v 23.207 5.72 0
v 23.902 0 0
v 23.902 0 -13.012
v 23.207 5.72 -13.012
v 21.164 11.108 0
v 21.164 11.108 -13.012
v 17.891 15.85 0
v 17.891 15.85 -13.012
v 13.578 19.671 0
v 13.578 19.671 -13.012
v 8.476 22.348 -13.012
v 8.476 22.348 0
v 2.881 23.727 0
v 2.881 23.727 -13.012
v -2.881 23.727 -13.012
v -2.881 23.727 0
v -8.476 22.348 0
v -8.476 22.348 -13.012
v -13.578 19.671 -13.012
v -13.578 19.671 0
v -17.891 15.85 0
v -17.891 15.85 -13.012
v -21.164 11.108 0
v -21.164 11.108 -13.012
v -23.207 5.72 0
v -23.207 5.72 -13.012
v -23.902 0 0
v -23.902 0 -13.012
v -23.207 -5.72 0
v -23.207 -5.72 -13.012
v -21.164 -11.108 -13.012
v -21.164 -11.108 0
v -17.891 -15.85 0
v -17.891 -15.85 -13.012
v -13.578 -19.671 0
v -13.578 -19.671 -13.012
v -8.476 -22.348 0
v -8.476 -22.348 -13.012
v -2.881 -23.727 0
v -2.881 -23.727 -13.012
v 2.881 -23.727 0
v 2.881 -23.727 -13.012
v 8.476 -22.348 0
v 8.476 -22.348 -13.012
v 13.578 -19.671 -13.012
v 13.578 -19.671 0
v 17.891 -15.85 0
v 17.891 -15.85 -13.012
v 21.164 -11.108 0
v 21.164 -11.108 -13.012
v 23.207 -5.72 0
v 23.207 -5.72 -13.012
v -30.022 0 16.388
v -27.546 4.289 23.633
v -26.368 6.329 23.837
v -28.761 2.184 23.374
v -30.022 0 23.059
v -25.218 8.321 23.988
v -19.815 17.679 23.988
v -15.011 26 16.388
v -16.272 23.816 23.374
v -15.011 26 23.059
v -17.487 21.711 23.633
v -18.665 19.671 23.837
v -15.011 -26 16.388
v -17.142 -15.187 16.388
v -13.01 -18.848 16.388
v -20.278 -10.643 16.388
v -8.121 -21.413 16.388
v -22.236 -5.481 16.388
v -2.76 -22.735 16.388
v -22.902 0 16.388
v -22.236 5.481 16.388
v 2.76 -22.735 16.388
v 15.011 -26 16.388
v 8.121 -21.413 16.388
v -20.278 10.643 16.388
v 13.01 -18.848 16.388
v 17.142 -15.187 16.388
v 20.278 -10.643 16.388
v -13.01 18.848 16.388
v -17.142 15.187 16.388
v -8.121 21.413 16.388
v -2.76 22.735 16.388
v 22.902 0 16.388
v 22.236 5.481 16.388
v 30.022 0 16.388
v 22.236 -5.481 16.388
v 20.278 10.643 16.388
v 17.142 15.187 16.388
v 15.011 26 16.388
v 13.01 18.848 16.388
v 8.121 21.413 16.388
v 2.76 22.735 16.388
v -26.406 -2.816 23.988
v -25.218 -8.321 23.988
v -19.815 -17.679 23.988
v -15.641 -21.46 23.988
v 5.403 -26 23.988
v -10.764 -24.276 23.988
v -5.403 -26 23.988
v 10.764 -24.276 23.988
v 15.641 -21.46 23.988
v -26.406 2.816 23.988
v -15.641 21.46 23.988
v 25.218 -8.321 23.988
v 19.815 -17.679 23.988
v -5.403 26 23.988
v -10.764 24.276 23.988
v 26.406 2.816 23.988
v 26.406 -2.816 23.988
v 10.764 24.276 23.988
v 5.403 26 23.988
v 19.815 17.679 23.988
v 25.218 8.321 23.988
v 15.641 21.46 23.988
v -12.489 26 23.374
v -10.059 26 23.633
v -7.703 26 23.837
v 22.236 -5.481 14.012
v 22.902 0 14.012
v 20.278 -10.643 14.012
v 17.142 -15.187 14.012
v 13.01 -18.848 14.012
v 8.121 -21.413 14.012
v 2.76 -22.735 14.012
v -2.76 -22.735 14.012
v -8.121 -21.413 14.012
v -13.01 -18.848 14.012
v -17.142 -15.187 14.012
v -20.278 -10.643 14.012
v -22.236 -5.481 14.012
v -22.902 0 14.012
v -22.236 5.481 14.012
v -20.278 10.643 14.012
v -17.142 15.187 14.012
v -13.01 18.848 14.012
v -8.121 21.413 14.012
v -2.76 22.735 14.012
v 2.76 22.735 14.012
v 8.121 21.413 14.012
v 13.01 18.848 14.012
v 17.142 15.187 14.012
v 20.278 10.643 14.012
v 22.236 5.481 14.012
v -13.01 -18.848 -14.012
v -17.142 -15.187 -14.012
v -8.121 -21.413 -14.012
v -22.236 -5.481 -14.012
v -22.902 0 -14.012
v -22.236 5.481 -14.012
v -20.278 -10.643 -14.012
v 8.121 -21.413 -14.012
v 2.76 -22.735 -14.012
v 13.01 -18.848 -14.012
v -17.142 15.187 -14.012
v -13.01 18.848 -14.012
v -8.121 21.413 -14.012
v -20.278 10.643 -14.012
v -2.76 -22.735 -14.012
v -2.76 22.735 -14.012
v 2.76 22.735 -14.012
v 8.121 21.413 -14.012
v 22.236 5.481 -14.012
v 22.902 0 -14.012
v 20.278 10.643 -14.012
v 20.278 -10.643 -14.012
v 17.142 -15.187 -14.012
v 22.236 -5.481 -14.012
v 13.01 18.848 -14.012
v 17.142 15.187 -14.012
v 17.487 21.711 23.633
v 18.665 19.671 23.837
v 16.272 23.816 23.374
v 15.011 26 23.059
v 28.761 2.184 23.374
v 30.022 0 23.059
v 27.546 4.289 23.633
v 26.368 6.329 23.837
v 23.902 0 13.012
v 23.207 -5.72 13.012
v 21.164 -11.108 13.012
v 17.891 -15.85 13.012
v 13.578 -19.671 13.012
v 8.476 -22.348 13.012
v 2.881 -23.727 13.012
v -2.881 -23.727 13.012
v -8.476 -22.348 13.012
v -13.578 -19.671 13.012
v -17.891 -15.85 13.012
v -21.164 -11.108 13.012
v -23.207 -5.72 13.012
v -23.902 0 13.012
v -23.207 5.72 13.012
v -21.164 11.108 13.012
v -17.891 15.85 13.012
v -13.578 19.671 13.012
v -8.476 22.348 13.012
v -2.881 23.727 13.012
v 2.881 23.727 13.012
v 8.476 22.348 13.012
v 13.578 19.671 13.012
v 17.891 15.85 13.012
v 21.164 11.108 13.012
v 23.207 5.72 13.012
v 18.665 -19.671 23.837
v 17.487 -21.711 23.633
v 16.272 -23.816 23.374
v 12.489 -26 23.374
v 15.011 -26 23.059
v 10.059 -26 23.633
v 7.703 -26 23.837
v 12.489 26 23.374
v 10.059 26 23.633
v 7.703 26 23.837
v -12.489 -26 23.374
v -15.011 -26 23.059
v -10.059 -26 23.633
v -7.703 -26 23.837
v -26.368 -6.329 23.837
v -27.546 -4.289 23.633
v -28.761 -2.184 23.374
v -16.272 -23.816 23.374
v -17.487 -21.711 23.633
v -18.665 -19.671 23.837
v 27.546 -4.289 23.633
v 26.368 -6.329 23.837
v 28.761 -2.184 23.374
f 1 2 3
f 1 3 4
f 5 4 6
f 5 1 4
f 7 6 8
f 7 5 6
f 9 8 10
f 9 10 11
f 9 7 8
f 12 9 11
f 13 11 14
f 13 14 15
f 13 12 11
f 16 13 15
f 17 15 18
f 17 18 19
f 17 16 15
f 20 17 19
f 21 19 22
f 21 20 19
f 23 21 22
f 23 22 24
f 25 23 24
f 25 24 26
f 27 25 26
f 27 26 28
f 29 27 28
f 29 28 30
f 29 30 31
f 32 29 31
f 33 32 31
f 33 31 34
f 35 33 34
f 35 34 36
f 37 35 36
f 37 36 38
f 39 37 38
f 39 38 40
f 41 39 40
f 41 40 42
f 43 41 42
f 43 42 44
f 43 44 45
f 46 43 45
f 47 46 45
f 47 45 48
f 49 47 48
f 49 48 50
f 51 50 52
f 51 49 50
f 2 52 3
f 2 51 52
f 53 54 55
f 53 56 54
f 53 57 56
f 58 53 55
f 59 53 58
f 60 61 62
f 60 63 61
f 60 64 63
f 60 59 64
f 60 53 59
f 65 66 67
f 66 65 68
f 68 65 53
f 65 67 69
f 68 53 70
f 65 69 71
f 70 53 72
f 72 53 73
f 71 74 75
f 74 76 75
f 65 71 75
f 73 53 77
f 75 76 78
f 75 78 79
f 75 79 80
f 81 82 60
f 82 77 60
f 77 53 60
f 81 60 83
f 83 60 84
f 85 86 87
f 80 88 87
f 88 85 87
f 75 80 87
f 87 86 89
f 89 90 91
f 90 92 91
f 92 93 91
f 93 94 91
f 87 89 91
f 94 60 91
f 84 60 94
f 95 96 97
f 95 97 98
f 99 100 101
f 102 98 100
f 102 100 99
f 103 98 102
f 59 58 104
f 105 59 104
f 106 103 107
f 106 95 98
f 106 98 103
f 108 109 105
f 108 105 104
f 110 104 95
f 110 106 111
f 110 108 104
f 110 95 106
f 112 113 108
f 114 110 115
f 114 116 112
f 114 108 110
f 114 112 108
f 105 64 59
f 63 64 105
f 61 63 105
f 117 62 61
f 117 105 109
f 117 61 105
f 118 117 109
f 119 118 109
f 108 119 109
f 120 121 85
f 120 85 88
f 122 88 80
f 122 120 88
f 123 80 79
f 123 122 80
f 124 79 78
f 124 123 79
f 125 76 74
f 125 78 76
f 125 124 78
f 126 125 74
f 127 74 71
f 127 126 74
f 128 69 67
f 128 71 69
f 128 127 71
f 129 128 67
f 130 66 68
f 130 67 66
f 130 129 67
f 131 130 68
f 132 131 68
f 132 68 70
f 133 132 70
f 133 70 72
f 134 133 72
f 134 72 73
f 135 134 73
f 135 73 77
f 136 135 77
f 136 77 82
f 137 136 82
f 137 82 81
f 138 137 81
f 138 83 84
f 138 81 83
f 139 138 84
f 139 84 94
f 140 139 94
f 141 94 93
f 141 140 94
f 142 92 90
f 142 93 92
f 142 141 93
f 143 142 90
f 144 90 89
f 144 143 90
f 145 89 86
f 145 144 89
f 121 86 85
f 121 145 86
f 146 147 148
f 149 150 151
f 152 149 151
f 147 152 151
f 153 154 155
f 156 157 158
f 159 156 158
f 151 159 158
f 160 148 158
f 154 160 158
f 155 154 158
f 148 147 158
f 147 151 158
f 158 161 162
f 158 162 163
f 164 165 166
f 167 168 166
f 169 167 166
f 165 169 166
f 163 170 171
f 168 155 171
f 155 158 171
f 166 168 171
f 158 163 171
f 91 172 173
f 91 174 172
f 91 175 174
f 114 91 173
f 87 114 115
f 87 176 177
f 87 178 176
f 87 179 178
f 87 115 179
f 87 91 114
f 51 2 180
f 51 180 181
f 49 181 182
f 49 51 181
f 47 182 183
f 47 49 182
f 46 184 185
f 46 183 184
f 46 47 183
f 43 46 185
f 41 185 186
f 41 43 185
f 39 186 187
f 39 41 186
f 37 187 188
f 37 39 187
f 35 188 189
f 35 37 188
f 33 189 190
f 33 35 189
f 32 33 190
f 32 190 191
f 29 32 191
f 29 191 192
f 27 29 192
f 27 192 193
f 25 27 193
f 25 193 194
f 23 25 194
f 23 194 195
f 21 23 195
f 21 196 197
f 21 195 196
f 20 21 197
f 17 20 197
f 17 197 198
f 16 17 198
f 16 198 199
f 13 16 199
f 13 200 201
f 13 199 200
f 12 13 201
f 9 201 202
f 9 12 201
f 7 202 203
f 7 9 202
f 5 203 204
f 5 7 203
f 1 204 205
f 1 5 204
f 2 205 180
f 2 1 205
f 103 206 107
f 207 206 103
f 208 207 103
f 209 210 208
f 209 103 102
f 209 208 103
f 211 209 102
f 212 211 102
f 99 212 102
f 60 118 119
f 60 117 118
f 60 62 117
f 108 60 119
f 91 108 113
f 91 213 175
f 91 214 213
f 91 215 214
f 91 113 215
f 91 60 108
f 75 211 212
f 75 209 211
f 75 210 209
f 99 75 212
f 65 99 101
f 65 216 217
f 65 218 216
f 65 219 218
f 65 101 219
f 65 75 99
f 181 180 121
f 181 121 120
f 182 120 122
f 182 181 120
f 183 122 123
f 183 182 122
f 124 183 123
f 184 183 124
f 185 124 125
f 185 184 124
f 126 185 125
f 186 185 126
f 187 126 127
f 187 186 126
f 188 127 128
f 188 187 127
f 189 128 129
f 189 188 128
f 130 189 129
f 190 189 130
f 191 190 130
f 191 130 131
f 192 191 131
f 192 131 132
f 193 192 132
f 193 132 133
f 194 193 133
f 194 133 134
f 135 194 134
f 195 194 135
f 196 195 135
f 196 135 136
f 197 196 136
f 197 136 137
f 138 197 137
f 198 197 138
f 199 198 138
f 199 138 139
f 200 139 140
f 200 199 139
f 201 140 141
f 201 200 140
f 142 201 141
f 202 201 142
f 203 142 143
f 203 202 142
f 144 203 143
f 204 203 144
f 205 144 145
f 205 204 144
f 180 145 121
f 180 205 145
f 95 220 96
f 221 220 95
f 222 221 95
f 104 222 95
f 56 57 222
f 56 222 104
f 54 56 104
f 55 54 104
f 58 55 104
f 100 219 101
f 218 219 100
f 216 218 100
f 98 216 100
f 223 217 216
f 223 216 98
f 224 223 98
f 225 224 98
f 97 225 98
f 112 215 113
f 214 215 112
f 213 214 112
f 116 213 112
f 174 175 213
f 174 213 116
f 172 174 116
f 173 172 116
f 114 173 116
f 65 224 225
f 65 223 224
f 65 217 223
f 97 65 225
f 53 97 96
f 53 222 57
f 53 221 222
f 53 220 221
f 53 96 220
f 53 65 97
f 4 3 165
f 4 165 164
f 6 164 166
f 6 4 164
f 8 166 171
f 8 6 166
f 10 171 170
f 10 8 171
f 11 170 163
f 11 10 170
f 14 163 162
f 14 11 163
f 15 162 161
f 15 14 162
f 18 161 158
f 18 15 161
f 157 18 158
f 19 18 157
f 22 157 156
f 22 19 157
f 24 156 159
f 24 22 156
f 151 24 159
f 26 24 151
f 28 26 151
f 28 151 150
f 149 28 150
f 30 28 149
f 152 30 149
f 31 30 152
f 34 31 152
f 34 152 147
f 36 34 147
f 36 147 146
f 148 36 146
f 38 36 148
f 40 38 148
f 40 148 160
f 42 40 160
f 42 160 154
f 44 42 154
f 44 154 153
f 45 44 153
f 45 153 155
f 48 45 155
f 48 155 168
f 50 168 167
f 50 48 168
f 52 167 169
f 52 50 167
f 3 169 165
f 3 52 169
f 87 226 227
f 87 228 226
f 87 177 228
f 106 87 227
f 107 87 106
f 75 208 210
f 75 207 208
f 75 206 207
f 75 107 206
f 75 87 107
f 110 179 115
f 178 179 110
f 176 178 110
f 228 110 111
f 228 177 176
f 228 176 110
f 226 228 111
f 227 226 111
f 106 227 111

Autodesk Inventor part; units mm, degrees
ref_plane "YZ Plane" through (0, 0, 0) normal (1, 0, 0) x (0, 1, 0)
ref_plane "XZ Plane" through (0, 0, 0) normal (0, 1, 0) x (-1, 0, 0)
ref_plane "XY Plane" through (0, 0, 0) normal (0, 0, 1) x (1, 0, 0)
sketch "Szkic7" plane through (0, 0, 0) normal (0, 0, 1) x (1, 0, 0)
  circle A0 centre (0, 0) radius 23.9015
  dimension "d35" = 47.803
extrude "Wyciągnięcie proste2" add sketch "Szkic7" along normal mid plane 28.025
chamfer "Faza2" distance 1 angle 45 1 edges at (-23.9015, 0, 14.0125)
sketch "Szkic9" plane through (0, 0, 14.0125) normal (0, 0, 1) x (1, 0, 0)
  circle A0 centre (0, 0) radius 22.9015 projected
extrude "Wyciągnięcie proste3" add sketch "Szkic9" along normal blind 2.375
sketch "Szkic10" plane through (0, 0, 16.3875) normal (0, 0, 1) x (1, 0, 0)
  line L0 (-15.0111, 26) -> (15.0111, 26)
  line L1 (15.0111, 26) -> (30.0222, 0)
  line L2 (30.0222, 0) -> (15.0111, -26)
  line L3 (15.0111, -26) -> (-15.0111, -26)
  line L4 (-15.0111, -26) -> (-30.0222, 0)
  line L5 (-30.0222, 0) -> (-15.0111, 26)
  line L6 (0, 33.4621) -> (0, -33.4621) construction
  line L7 (-33.4621, 0) -> (33.4621, 0) construction
  point P0 (0, 0)
  point P1 (0, 0)
  point P2 (0, 26)
  dimension "d44" = 52
extrude "Wyciągnięcie proste4" add sketch "Szkic10" along normal blind 7.6
sketch "Szkic12" plane through (0, 0, 0) normal (0, 1, 0) x (-1, 0, 0)
  line L0 (0, -2.1463) -> (0, 12.8775) construction
  line L1 (-15.0111, 16.3875) -> (-15.0111, 23.9875) construction
  line L2 (-30.0222, 23.9875) -> (-15.0111, 23.9875) construction
  line L3 (-30.0222, 16.3875) -> (-30.0222, 23.9875) projected
  line L4 (-30.0222, 23.0586) -> (-26.5555, 23.9875)
  line L5 (-30.0222, 23.9875) -> (-15.0111, 23.9875) projected
  line L6 (-30.0222, 16.3875) -> (-15.0111, 16.3875) projected
  point P0 (0, 0)
  dimension "d50" = 15
  dimension "d51" = 3.4667
revolve "Obrót2" cut sketch "Szkic12" angle 360 about axis through (0, 0, -10) along (0, 0, 1)
thread "Gwint3" size "G47.803x2.309" designation "G 1 1/2" class "A" standard "ISO Pipe Threads" full length
chamfer "Faza3" distance 1 angle 45 1 edges at (-23.9015, 0, -14.0125)
equation "\"d35\" = OD"
equation "\"d36\" = 0.7375 * L"
equation "\"d42\" = 0.0625 * L"
equation "\"d44\" = SW"
equation "\"d45\" = 0.2 * L"
equation "\"d51\" = 0.0666667 * SW"
equation "\"SzerokośćGięciaPodcięcia\" = Grubość"
equation "\"RozmiarPodcięciaNarożnika\" = 4 * Grubość"
equation "\"PromieńPrzejścia\" = PromieńGięcia"
equation "\"Rozmiar_promienia_Jacobiego\" = PromieńGięcia"
equation "\"Wielk_odstępu\" = Grubość"
equation "\"d2\" = PromieńGięcia"
equation "\"d23\" = PromieńGięcia"
equation "\"OD\" = 47.803"
equation "\"SW\" = 52"
equation "\"L\" = 38"
equation "\"Grubość\" = 1.5"
equation "\"PromieńGięcia\" = 3"
properties part number "Korek sześciokątny BSP 1 1/2'' L=38" material "304"
